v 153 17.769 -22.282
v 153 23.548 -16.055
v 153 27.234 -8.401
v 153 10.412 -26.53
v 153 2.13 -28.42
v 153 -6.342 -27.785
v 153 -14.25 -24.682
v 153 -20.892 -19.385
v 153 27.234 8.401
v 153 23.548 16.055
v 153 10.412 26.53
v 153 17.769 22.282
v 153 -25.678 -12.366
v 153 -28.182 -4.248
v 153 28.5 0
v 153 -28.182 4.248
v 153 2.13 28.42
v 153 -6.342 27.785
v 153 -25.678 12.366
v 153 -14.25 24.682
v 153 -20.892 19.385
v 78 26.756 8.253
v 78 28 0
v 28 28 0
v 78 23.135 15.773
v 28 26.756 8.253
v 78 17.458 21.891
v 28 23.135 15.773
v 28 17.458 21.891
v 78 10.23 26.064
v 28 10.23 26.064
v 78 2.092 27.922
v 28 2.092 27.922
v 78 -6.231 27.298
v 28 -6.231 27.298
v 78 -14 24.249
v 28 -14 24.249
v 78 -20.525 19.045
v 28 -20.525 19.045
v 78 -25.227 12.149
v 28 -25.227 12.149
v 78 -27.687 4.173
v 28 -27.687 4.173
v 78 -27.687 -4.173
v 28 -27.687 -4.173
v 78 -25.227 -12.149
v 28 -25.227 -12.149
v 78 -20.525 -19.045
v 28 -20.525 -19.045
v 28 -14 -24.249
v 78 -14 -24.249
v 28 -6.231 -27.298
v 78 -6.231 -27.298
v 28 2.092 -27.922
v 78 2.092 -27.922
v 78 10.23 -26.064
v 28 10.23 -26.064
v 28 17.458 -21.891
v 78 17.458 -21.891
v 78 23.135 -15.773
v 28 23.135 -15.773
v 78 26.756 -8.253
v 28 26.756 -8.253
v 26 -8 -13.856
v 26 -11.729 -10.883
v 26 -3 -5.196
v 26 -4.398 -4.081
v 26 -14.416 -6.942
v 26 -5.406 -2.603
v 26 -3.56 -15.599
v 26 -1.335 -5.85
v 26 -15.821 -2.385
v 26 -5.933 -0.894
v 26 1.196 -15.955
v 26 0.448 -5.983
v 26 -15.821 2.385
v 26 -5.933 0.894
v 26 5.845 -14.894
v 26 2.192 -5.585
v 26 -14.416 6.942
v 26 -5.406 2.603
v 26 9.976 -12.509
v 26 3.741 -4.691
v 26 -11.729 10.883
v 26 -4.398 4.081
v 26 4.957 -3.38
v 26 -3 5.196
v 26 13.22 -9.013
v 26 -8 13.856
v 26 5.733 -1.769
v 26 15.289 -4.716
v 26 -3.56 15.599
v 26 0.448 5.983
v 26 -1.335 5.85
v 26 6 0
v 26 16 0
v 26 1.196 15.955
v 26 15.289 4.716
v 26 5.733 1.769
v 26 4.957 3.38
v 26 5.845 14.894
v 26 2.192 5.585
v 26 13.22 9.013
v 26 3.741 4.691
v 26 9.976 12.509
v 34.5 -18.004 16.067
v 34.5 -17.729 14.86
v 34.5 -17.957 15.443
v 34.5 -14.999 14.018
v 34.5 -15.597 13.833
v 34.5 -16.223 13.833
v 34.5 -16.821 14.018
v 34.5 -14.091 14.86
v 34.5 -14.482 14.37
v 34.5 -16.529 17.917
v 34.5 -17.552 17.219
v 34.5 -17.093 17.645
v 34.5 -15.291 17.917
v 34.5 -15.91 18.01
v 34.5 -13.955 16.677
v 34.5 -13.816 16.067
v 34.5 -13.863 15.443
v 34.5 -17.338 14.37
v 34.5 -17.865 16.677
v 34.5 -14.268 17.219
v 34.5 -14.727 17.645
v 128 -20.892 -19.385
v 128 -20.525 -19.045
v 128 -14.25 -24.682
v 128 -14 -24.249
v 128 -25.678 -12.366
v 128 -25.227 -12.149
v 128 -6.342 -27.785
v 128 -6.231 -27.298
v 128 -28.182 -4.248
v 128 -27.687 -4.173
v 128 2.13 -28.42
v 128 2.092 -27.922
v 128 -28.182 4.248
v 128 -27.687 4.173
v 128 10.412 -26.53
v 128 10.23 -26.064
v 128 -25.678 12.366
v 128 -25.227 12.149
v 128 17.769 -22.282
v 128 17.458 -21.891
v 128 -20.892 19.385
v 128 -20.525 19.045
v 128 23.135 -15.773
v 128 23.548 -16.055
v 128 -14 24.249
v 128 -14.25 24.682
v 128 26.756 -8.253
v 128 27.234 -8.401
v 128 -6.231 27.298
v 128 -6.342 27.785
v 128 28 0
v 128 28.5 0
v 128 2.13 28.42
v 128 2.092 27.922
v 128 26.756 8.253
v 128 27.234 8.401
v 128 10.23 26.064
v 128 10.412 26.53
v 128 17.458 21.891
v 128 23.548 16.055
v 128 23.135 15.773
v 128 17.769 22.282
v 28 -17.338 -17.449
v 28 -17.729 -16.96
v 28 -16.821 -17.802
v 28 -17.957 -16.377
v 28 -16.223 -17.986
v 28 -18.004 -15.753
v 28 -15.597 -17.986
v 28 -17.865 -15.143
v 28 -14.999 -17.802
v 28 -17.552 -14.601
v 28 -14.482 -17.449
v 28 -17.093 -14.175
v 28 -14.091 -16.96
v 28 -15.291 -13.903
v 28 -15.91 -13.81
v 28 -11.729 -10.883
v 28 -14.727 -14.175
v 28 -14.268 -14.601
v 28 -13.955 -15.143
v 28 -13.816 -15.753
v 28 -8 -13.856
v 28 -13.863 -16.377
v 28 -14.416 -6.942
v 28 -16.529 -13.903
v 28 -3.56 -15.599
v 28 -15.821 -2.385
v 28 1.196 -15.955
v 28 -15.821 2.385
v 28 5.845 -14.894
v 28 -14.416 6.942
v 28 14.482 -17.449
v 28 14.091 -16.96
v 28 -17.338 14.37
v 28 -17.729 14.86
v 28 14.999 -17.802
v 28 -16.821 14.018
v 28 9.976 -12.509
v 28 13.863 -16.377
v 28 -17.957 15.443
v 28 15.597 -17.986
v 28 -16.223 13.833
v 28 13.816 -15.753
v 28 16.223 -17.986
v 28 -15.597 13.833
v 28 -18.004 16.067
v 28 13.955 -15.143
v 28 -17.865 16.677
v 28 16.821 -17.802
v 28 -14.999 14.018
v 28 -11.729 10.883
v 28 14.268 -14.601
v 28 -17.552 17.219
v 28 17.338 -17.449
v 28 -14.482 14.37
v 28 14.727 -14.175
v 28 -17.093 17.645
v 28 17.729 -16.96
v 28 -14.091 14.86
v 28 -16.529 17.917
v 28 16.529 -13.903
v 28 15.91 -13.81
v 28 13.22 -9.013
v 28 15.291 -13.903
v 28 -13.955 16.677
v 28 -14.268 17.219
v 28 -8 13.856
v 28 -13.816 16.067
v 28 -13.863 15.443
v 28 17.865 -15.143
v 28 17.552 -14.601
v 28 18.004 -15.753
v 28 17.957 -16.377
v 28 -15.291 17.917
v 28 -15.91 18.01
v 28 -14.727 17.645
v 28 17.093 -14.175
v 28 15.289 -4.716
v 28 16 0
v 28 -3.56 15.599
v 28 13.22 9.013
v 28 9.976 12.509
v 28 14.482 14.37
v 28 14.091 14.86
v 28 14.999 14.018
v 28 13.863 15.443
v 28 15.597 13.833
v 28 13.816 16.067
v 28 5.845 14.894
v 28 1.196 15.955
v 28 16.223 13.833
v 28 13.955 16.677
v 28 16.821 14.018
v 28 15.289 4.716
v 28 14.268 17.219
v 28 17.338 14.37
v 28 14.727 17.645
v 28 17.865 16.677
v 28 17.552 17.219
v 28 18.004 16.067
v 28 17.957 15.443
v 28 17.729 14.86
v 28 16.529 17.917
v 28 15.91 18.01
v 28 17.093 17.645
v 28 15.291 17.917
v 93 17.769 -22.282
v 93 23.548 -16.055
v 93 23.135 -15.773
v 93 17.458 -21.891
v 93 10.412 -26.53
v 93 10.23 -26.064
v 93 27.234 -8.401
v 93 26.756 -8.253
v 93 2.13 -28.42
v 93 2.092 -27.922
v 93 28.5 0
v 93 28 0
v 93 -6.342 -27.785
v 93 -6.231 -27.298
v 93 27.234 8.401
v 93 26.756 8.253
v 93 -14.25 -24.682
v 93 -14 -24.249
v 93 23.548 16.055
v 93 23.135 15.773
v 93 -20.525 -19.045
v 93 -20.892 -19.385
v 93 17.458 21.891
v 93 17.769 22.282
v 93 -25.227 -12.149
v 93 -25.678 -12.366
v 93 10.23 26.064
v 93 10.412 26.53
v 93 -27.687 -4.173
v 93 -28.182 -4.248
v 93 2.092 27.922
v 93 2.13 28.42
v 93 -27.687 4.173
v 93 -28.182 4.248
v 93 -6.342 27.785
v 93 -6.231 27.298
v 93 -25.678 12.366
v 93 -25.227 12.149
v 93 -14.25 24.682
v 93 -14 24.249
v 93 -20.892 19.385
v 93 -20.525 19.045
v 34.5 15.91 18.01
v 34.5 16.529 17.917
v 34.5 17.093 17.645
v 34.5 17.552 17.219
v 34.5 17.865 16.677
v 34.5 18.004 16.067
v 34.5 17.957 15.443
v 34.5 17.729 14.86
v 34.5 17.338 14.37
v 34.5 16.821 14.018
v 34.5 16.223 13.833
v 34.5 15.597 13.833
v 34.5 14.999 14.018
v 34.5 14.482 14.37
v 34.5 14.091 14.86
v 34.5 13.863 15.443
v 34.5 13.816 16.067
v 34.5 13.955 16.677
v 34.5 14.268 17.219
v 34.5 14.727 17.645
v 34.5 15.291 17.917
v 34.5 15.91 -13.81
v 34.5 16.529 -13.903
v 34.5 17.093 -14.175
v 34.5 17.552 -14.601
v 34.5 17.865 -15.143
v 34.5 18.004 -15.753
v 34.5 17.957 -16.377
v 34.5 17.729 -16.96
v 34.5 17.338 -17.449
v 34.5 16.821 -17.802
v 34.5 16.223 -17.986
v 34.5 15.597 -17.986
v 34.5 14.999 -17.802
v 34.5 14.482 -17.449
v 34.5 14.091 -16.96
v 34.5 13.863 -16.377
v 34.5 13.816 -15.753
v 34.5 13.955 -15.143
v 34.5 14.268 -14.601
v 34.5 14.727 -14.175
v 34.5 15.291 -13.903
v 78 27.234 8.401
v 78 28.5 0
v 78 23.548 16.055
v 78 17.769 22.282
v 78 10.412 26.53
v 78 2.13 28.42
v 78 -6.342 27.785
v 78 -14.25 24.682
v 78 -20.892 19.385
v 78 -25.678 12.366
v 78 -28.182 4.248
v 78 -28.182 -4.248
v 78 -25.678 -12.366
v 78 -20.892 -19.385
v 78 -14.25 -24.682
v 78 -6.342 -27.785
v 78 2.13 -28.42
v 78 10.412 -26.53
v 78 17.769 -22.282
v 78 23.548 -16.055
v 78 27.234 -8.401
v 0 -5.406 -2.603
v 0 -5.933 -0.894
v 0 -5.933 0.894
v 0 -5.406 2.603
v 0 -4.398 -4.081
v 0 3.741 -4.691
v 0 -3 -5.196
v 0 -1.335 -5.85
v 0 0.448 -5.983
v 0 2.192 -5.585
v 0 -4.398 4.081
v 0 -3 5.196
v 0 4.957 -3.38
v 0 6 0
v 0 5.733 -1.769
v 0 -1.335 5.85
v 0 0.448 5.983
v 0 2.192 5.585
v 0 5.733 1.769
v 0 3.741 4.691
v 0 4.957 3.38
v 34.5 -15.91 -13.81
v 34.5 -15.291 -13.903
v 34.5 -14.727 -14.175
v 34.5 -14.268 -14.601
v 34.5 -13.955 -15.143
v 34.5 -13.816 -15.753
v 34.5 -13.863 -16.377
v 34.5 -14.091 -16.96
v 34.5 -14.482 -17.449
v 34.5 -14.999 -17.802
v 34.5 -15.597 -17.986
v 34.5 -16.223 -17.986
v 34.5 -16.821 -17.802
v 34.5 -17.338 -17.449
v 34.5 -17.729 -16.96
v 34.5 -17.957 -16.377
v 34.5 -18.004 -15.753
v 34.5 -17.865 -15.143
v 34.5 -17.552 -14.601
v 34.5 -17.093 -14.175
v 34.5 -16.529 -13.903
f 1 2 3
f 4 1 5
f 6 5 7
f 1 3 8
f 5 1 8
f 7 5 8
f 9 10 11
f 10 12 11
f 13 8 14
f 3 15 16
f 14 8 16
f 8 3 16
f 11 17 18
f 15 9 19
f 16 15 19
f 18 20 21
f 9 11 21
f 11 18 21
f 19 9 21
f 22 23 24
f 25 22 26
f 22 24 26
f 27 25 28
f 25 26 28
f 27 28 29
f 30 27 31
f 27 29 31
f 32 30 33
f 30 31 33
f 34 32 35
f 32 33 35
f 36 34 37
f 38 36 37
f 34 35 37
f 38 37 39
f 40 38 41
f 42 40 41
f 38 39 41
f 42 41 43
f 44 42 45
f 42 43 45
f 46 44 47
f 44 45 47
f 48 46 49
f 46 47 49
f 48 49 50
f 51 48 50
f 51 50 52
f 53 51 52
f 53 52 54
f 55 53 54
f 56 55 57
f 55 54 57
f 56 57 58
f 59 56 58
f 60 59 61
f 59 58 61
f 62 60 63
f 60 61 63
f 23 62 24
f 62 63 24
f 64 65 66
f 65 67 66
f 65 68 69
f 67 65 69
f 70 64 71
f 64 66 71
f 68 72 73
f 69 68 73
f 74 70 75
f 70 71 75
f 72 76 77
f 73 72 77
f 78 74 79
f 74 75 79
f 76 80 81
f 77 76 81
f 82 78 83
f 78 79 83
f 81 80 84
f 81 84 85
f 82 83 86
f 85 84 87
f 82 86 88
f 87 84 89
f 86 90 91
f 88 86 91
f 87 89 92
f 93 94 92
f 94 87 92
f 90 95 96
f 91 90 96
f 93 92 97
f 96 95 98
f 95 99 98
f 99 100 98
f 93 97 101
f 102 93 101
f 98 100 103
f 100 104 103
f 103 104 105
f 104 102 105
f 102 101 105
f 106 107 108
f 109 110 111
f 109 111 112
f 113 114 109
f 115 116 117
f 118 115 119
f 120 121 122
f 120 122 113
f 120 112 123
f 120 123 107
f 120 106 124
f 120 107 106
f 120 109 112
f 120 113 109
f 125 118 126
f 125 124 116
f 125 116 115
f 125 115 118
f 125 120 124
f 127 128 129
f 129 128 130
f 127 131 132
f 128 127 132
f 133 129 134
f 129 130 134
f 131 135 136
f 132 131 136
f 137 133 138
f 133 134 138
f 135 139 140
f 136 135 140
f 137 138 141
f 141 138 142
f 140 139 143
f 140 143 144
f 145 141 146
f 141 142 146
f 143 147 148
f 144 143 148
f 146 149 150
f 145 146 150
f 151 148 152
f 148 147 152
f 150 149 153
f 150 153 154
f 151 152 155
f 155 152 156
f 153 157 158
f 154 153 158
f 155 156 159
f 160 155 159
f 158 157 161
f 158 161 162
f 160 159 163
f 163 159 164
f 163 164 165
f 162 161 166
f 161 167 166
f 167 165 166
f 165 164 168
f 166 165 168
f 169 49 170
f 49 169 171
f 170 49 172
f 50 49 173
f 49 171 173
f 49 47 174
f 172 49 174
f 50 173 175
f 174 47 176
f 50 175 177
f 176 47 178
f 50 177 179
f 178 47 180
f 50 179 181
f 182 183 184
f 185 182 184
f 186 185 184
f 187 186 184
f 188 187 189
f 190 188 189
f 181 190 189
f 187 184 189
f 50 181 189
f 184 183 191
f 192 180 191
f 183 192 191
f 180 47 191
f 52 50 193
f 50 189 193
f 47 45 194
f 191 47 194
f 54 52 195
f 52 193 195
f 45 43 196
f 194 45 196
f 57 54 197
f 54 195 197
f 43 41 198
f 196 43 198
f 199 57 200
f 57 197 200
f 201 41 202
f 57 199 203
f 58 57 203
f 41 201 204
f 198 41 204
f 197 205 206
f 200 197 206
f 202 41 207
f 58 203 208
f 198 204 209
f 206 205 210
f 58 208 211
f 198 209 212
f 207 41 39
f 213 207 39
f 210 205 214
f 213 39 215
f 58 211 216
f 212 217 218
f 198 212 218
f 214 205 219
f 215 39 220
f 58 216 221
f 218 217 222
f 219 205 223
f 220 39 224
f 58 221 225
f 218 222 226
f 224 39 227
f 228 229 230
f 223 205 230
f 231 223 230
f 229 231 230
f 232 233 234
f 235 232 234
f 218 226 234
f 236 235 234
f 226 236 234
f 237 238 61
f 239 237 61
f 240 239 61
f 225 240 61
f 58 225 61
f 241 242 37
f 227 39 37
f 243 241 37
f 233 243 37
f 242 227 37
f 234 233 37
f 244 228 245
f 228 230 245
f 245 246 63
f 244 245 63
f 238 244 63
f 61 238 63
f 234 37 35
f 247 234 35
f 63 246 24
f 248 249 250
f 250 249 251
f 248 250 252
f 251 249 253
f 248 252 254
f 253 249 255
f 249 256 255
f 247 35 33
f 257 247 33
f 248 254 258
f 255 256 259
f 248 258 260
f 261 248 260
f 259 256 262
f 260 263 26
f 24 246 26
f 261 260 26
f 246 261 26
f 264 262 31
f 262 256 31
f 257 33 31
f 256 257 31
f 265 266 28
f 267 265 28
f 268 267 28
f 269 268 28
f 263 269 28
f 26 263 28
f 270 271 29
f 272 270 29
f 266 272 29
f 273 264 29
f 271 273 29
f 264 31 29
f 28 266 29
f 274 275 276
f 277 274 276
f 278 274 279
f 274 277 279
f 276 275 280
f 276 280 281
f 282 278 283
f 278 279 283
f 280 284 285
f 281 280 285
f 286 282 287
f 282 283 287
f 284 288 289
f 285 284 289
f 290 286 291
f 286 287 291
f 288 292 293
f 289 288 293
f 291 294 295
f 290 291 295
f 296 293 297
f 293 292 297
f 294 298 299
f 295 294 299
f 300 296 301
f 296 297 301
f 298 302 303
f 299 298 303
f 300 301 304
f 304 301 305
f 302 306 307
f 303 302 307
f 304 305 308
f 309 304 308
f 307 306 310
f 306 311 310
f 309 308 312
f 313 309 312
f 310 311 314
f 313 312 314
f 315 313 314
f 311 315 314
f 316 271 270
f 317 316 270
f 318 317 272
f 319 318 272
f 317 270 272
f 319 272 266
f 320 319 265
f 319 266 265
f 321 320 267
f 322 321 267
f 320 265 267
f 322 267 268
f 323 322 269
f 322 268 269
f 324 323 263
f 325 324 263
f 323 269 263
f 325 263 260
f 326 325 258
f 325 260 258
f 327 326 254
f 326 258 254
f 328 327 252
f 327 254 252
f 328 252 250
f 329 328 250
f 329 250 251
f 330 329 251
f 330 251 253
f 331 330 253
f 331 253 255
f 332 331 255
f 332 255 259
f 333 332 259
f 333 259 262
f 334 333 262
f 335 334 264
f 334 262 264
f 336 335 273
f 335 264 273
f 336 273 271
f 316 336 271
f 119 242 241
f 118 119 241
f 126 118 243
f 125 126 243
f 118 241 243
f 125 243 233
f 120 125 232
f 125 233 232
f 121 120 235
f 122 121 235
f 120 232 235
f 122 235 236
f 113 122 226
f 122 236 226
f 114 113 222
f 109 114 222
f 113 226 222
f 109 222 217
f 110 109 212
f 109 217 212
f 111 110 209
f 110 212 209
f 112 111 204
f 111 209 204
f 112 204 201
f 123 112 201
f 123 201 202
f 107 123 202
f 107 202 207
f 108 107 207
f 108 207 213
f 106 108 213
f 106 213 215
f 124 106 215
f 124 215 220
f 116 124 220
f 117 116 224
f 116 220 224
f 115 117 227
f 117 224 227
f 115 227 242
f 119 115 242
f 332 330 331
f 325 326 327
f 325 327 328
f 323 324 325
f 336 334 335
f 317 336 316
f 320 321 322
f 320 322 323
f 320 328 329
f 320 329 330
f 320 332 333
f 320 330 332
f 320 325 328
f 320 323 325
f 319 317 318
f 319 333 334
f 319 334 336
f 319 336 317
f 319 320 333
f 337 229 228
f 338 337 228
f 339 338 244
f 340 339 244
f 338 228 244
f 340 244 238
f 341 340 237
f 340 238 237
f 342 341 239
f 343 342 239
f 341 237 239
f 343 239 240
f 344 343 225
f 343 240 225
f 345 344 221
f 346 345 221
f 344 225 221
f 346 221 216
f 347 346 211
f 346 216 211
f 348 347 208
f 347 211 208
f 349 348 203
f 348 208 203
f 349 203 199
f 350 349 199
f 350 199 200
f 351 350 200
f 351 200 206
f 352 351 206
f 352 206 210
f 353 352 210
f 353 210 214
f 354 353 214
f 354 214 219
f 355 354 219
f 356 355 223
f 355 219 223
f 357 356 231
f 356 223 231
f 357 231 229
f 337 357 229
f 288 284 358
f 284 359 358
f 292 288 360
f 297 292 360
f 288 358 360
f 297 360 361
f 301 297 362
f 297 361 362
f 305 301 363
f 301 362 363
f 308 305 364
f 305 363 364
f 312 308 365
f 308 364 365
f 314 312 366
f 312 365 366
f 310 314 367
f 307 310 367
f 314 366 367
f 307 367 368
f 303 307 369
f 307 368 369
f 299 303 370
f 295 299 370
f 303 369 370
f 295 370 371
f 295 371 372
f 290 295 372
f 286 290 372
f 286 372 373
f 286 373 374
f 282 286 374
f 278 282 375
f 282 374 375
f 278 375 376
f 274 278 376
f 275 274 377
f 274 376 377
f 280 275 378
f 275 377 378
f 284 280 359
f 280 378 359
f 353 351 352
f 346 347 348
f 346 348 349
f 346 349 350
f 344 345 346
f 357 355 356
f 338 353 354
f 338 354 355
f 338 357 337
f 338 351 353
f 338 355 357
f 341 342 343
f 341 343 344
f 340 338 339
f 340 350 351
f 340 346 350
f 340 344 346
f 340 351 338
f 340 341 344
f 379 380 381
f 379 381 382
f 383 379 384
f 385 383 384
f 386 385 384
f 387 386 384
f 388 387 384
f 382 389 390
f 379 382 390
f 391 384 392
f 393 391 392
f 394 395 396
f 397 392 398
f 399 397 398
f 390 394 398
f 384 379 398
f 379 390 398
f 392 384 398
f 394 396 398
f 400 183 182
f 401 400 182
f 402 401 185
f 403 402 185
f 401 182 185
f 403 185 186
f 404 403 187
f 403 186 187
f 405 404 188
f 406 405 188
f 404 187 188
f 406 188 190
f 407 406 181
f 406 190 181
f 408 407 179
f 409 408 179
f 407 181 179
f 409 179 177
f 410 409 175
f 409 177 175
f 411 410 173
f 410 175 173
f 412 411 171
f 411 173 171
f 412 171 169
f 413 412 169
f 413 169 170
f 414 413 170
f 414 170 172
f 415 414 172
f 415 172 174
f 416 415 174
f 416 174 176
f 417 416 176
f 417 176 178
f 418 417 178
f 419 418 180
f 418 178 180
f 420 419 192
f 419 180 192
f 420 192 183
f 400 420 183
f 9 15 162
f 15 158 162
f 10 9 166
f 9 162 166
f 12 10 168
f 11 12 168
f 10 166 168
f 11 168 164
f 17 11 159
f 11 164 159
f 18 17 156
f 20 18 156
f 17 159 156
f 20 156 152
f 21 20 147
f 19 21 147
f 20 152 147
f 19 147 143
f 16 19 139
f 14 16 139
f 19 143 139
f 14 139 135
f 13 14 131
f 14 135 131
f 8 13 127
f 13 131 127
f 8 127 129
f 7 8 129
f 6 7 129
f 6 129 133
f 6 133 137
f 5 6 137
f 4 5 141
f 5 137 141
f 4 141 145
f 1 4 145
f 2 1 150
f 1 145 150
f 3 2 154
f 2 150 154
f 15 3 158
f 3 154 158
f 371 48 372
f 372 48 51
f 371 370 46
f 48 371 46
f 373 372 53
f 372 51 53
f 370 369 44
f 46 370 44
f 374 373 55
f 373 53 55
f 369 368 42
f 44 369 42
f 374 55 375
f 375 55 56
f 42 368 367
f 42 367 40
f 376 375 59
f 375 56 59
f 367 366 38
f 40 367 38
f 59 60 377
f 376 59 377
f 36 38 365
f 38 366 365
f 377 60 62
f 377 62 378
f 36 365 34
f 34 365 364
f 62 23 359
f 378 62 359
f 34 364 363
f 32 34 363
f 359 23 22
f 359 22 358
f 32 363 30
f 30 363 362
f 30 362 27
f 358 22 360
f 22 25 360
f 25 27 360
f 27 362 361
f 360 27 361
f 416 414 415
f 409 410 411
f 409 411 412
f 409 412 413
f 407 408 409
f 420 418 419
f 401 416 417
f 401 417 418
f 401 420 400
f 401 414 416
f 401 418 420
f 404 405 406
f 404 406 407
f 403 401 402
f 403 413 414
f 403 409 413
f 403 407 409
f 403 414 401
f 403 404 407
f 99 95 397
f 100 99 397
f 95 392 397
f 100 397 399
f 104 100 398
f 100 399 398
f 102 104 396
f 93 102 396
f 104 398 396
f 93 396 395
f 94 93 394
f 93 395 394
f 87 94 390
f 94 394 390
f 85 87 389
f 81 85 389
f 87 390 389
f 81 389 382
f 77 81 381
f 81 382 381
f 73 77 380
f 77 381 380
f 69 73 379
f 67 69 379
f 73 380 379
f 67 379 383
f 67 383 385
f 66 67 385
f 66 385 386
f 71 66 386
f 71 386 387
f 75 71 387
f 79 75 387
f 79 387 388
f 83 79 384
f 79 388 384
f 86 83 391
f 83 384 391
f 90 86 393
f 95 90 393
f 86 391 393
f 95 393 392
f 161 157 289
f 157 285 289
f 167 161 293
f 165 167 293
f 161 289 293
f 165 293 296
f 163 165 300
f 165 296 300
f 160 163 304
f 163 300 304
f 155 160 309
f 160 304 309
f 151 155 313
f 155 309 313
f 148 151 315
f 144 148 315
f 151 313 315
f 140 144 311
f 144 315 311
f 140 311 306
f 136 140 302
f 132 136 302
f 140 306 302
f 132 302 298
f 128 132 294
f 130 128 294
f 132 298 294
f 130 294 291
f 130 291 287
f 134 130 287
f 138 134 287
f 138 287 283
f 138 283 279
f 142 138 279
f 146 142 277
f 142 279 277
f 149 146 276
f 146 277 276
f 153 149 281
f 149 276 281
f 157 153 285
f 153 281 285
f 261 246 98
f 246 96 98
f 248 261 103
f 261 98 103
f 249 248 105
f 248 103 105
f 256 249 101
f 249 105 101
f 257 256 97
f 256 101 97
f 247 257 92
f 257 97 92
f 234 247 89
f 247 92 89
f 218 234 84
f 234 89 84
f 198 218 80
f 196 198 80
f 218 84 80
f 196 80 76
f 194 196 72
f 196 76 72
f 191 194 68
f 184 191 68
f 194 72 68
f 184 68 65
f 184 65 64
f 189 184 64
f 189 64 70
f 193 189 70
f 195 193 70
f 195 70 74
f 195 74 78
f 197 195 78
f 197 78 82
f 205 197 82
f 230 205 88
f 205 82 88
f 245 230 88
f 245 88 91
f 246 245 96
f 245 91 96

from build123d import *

# Parameters (mm, degrees)
SKETCH2_R          = 2.1
CUT_EXTRUDE1_DEPTH = 6.5


with BuildPart() as part:
    # Sketch1 → Revolve1 (revolve)
    with BuildSketch(Plane.XY):
        Polygon((0, 0), (153, 0), (153, 28.5), (128, 28.5), (128, 28), (93, 28), (93, 28.5), (78, 28.5), (78, 28), (28, 28), (28, 16), (26, 16), (26, 6), (0, 6), align=None)
    revolve(axis=Axis((-903.237381769, 0, 0), (1, 0, 0)))

    # Sketch2 → Cut-Extrude1 (cut)
    with BuildSketch(Plane.ZY.offset(-28)):
        with Locations((-15.909902577, 15.909902577)):
            Circle(SKETCH2_R)
        with Locations((15.909902577, 15.909902577)):
            Circle(SKETCH2_R)
        with Locations((15.909902577, -15.909902577)):
            Circle(SKETCH2_R)
        with Locations((-15.909902577, -15.909902577)):
            Circle(SKETCH2_R)
    extrude(amount=-CUT_EXTRUDE1_DEPTH, mode=Mode.SUBTRACT)


solid = part.part
